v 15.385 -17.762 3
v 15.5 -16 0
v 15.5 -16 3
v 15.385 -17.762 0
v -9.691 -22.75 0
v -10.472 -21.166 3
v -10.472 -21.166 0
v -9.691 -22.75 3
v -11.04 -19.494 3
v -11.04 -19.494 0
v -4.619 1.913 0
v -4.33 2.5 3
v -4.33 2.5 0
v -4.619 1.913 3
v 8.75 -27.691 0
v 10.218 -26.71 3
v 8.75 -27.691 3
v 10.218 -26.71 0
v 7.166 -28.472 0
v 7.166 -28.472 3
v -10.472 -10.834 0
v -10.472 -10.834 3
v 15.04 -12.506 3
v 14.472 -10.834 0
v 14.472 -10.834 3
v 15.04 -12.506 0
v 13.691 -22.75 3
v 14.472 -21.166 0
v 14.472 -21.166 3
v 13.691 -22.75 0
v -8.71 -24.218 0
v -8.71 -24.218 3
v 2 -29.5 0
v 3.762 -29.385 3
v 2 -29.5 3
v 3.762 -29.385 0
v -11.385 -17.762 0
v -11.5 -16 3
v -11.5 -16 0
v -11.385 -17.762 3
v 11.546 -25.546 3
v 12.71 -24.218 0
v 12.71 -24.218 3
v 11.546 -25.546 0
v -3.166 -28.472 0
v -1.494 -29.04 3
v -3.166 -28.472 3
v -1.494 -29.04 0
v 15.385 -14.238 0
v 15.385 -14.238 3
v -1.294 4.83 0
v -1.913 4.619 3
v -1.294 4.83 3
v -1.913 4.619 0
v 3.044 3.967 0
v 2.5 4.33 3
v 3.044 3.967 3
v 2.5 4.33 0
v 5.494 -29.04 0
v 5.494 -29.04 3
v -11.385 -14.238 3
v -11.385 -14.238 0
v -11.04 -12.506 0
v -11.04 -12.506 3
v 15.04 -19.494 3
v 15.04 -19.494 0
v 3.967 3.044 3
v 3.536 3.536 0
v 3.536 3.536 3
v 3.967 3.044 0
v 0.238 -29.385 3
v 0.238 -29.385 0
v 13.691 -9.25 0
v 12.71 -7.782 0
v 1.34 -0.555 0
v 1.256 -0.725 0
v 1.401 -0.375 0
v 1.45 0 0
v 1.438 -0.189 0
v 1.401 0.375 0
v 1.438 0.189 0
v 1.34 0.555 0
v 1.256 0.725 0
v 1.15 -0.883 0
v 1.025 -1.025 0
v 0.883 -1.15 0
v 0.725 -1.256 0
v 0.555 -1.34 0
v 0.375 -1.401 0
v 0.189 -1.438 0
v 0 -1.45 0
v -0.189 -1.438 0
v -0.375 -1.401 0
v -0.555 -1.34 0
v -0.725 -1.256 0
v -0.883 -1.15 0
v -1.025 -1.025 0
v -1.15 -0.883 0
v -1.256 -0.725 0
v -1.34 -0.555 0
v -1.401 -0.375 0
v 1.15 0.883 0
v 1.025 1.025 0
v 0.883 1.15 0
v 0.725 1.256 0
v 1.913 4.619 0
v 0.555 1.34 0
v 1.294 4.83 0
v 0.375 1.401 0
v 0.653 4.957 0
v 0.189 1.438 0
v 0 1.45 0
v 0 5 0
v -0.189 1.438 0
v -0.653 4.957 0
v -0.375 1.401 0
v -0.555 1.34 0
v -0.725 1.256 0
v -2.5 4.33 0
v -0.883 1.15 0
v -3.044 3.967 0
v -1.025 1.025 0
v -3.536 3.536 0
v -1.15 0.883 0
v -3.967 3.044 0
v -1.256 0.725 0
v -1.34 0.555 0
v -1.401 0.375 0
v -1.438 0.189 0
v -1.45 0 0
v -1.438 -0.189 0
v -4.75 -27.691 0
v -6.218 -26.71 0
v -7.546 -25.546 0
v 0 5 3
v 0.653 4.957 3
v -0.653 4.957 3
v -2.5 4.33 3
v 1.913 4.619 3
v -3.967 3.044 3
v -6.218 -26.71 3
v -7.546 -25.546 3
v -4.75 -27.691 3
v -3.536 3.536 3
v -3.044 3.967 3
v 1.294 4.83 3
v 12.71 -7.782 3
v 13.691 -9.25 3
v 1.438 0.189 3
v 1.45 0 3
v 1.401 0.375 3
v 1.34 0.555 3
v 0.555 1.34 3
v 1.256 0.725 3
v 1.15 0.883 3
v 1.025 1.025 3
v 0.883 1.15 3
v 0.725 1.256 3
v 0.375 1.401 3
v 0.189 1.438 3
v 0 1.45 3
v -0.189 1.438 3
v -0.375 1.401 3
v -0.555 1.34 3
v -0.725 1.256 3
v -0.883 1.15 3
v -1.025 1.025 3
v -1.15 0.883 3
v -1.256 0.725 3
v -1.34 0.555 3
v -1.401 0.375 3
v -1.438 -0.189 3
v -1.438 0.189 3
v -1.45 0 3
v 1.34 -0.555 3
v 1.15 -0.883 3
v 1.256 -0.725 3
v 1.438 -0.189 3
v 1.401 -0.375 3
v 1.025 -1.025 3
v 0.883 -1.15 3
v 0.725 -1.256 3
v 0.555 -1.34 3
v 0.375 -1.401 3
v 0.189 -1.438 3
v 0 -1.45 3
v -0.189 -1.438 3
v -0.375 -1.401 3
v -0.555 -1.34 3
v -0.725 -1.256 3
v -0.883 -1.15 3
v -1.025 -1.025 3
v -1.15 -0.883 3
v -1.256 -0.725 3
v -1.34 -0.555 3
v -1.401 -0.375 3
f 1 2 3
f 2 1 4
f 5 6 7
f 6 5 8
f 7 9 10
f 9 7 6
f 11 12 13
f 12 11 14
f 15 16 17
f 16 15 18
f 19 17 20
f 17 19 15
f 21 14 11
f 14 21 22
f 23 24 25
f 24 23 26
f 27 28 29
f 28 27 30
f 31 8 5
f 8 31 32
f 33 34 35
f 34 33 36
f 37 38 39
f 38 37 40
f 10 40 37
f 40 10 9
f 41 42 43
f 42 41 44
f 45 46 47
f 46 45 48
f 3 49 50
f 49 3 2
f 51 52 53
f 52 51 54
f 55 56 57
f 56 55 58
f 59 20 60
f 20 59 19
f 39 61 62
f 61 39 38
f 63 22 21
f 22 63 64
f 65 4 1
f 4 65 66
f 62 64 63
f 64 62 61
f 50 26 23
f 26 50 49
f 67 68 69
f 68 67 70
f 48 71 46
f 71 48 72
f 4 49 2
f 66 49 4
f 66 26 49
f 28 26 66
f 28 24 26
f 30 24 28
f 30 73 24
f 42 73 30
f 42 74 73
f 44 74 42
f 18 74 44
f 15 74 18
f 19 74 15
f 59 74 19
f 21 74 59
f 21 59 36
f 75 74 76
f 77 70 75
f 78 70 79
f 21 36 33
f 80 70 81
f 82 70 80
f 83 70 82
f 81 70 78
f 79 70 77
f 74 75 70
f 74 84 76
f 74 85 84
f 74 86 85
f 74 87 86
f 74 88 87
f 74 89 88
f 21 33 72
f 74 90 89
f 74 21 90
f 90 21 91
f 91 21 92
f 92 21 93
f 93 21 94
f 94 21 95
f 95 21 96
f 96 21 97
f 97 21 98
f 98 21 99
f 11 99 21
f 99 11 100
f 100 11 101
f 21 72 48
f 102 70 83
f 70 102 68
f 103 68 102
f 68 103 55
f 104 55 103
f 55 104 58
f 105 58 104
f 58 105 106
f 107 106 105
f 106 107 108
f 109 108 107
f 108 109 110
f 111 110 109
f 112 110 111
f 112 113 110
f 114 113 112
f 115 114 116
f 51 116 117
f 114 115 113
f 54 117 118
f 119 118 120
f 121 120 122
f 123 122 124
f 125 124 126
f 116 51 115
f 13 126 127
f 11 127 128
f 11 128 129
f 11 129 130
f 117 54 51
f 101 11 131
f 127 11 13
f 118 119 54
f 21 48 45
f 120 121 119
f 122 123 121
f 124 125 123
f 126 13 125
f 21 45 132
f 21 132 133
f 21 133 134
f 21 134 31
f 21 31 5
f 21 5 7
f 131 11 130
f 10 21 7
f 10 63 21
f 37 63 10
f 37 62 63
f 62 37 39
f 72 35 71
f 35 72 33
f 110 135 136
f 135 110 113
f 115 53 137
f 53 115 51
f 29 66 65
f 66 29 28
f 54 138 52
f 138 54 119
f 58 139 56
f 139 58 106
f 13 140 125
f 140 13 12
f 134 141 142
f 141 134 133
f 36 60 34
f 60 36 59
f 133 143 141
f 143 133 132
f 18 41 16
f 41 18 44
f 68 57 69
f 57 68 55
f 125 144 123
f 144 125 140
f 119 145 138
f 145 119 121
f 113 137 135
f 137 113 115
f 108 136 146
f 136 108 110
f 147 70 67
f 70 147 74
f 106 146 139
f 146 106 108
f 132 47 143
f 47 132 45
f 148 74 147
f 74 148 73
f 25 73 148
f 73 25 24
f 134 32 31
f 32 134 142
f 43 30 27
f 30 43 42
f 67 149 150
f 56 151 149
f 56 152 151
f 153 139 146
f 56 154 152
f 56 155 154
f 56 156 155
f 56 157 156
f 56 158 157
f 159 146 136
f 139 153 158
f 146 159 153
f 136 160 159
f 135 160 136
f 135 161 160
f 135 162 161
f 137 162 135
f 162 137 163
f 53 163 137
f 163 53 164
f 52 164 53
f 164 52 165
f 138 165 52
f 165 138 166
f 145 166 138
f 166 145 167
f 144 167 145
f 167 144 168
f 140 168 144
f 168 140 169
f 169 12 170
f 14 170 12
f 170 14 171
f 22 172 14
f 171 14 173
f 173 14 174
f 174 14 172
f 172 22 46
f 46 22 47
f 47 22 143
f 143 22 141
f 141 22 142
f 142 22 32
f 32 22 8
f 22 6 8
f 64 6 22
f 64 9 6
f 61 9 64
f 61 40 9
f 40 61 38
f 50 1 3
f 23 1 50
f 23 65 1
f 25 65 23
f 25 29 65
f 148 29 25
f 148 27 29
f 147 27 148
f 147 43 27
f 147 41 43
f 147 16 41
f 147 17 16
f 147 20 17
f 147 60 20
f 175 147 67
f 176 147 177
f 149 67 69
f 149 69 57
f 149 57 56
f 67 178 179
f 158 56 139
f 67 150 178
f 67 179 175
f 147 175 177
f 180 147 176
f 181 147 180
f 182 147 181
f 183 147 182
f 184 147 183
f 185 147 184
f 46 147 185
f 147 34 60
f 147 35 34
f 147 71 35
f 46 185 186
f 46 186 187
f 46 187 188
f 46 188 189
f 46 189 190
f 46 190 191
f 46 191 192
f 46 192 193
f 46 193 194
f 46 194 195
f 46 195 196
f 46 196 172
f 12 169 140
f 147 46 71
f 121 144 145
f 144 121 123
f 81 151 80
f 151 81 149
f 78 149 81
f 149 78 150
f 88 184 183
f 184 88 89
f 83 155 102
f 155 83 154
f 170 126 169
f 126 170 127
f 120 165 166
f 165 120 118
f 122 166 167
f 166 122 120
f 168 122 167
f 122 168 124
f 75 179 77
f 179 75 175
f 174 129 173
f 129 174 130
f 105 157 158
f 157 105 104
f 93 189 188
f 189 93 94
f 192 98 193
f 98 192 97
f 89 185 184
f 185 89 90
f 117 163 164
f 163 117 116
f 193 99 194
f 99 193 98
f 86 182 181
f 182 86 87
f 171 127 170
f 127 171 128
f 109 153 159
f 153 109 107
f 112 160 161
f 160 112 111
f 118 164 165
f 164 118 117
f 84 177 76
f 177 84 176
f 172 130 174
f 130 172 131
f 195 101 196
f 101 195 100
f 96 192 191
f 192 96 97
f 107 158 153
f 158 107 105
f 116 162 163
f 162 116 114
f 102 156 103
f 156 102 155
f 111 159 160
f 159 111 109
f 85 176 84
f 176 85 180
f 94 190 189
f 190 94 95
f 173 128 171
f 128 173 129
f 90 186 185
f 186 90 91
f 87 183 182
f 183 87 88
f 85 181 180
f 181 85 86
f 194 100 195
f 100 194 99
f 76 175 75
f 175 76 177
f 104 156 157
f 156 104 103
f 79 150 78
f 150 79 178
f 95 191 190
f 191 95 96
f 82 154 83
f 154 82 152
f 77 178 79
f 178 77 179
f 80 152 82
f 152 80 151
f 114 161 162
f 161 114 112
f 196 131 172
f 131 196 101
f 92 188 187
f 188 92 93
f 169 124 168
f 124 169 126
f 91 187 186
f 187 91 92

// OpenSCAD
// file: dog-puppy2-common.scad
// Shared numbers for Puppy V2 (checkpoint 6). Units mm, whole-dog coordinates:
// x = forward, y = left, z = up, z=0 is the underside of Dog body V2 (dog-body-v2.scad).
// V2 changes from V1: the legs are OUTSIDE a slimmer body so they can swing 90 deg and the dog
// can lie flat; the head is small with a big screen face; the breadboard moved into the body.
// Included by dog-deck-v3, dog-shell-v2, dog-head-v2, dog-ears-v2 and dog-v2-assembly.
deck_z=30; deck_t=3; deck_top=deck_z+deck_t;    // deck sits on the 30mm body walls
clr=0.5;                                        // per side; this printer makes holes small
m2_pilot=1.7;                                   // M2 machine screw cuts its own thread in PLA
m2_free=2.9;                                    // M2 passes through freely (Leg V4 lesson)
nut_flat=4.6; nut_h=1.8;                        // M2 nut trap
wall=2;                                         // shell and head wall

// SG90 sticking out of the body wall (wall face y=24), from the seller drawing, NOT measured:
case_top_y=28.3; gear_top_y=32.3; leg_in_y=37; leg_out_y=45.5; shaft_x=45; shaft_z=15;

// body shell: a long round capsule, narrower than the legs. U-slots open at the bottom let it
// drop over the servo gear towers.
shell=[150,64]; shell_bot=4; shell_top=66;
shell_rp=24;            // round ends seen from above
shell_rt=26;            // how far down the top edge curls
gear_slot_r=8.5;        // around each servo shaft
gear_slot_back=3;       // the slot also reaches this far toward the middle (second gear bump)

// head: small and round, so the screen is a big part of the face. It sits straight on the body.
head=[50,56]; head_cx=50; head_bot=58; head_top=112;
head_R=22; face_w=46; face_z=[66,108]; face_r=12;
chin_z=66; chin_t=3; chin_top=chin_z+chin_t;    // chin plate rests on the flat top of the body
chin_screw=[[34,-6],[34,6]];                    // M2 x 10 + nut: chin plate to body roof
wire_hole=[[44,54],3.5];                        // OLED wires: x range, half width in y
ear_x=42; ear_z=99;

module rounded_block(size,z0,z1,rp,rt) hull() for(sx=[-1,1],sy=[-1,1])
  translate([sx*(size[0]/2-rp),sy*(size[1]/2-rp),0]) {
    translate([0,0,z0]) cylinder(r=rp,h=z1-rt-z0);
    translate([0,0,z1-rt]) scale([1,1,rt/rp]) sphere(rp);
  }
module shell_solid(o=0) rounded_block([shell[0]-2*o,shell[1]-2*o],shell_bot-(o>0?1:0),shell_top-o,shell_rp-o,shell_rt-o);
// shell footprint seen from above, shrunk by o (used for the deck outline)
module shell_plan(o=0) hull() for(sx=[-1,1],sy=[-1,1]) translate([sx*(shell[0]/2-shell_rp),sy*(shell[1]/2-shell_rp)]) circle(shell_rp-o);
module head_solid(o=0) intersection() {
  hull() {
    for(sy=[-1,1],z=[head_top-head_R, head_bot+head_R*0.6]) translate([head_cx-head[0]/2+head_R,sy*(head[1]/2-head_R),z]) sphere(head_R-o);
    translate([head_cx+head[0]/2-o-0.01,0,0]) rotate([0,90,0]) linear_extrude(0.01) hull()
      for(sy=[-1,1],z=[face_z[0]+face_r, face_z[1]-face_r]) translate([-z,sy*(face_w/2-face_r)]) circle(face_r-o);
  }
  translate([-200,-200,head_bot-(o>0?1:0)]) cube([400,400,200]);
}
module head_outer() difference() { head_solid(0); shell_solid(-clr); }
// top of the shell's inside at (x,y): used to check boards fit under the roof
function roof_in(y) = let(o=wall, cy=shell[1]/2-shell_rp, r=shell_rp-o, dy=max(0,abs(y)-cy))
  dy>=r ? -1 : shell_top-shell_rt + (shell_rt-o)*sqrt(1-pow(dy/r,2));
// main file
// Dog ears V2 (Puppy V2). Print 2, flat, no supports. Try a different colour!
// Rounder and softer than V1: a big round flap that hangs from one screw. The M2 x 10 screw
// goes through the top hole, through the head and into the chin post. Flip one over for a pair.
include <dog-puppy2-common.scad>
$fn=48;
ear_t=3;
difference() {
  linear_extrude(ear_t) hull() { circle(d=10); translate([2,-16]) circle(d=27); }
  translate([0,0,-1]) cylinder(d=m2_free,h=ear_t+2);
}
